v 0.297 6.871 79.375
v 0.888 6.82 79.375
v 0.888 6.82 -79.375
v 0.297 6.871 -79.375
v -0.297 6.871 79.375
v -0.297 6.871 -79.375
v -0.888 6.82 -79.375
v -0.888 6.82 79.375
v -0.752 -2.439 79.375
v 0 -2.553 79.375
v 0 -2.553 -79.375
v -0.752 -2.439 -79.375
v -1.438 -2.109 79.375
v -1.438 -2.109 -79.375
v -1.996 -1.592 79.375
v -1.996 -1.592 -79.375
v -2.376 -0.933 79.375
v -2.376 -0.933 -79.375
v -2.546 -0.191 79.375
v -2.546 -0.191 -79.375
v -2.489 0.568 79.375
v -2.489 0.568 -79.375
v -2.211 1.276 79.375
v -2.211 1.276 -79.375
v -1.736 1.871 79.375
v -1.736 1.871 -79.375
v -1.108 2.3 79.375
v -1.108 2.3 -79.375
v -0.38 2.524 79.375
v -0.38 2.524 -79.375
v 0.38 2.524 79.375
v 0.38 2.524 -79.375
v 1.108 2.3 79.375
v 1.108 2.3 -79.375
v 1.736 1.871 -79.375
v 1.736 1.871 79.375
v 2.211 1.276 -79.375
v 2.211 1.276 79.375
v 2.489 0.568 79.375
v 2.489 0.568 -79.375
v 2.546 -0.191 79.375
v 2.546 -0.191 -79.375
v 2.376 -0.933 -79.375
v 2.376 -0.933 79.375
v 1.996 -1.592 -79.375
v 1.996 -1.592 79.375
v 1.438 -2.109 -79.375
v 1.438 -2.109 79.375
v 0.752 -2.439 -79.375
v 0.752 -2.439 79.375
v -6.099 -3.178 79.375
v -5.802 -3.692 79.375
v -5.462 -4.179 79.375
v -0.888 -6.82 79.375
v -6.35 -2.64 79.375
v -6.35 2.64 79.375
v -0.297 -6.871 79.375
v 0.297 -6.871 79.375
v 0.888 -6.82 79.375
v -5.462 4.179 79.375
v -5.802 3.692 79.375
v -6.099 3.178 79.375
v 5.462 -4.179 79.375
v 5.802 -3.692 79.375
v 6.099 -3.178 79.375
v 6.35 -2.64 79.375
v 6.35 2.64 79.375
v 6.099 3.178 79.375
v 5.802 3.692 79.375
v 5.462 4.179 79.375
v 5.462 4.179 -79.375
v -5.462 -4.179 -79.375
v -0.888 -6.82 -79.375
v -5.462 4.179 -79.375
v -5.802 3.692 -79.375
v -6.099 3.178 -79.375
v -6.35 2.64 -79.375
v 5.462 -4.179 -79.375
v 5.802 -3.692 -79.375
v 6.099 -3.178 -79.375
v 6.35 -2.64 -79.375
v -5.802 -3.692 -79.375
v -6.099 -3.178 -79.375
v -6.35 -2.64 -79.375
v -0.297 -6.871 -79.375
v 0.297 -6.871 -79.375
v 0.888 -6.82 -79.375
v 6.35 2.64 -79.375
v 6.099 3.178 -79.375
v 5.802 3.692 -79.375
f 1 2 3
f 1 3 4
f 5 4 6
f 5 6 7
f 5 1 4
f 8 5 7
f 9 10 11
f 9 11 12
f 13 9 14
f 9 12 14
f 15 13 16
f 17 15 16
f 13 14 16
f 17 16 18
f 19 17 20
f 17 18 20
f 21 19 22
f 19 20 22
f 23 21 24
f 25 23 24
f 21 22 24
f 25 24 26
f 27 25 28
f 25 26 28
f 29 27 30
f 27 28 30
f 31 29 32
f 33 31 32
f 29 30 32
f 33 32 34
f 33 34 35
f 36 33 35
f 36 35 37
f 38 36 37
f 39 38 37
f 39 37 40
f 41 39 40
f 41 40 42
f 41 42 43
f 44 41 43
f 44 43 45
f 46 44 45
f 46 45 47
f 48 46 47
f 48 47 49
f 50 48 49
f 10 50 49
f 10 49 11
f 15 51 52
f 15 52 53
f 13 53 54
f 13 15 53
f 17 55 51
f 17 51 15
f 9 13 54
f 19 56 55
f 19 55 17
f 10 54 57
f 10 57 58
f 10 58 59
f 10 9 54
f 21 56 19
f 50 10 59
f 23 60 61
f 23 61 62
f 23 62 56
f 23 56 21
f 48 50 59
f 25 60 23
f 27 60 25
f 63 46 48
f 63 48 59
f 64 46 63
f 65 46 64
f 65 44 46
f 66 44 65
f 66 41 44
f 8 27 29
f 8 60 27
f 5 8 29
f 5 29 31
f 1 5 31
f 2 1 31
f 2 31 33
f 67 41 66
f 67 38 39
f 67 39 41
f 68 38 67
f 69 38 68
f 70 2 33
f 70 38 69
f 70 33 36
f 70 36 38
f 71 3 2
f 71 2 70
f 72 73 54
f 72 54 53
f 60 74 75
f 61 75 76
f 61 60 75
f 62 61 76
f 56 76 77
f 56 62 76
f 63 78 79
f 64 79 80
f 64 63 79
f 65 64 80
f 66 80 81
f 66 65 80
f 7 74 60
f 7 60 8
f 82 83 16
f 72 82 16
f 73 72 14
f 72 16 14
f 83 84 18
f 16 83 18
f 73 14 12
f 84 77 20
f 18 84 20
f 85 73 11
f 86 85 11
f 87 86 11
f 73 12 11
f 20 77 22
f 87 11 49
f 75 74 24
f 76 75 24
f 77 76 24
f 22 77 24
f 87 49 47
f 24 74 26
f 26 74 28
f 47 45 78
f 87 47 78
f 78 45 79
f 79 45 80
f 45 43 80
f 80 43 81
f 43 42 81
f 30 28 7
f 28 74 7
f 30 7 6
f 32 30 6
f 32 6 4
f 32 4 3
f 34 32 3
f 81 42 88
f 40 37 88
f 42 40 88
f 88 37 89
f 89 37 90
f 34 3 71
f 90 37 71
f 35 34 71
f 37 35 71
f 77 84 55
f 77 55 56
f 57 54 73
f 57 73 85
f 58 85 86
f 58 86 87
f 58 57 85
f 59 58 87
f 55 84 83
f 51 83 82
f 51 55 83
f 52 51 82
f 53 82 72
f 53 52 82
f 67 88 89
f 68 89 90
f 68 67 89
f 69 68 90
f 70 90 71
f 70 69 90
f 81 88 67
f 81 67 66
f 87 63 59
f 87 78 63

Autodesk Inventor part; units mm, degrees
ref_plane "YZ Plane" through (0, 0, 0) normal (1, 0, 0) x (0, 1, 0)
ref_plane "XZ Plane" through (0, 0, 0) normal (0, 1, 0) x (-1, 0, 0)
ref_plane "XY Plane" through (0, 0, 0) normal (0, 0, 1) x (1, 0, 0)
sketch "Sketch1" plane through (0, 0, 0) normal (0, 0, 1) x (1, 0, 0)
  line L0 (-6.35, -3.6662) -> (-6.35, 3.6662)
  line L1 (-6.35, 3.6662) -> (0, 7.3323)
  line L2 (0, 7.3323) -> (6.35, 3.6662)
  line L3 (6.35, 3.6662) -> (6.35, -3.6662)
  line L4 (6.35, -3.6662) -> (0, -7.3323)
  line L5 (0, -7.3323) -> (-6.35, -3.6662)
  point P0 (0, 0)
  point P1 (0, 0)
  dimension "Size" = 12.7
extrude "Extrusion1" add sketch "Sketch1" along normal mid plane 158.75
sketch "Sketch3" plane through (0, 0, 79.375) normal (0, 0, 1) x (1, 0, 0)
  line L0 (-6.35, 3.6662) -> (0, 7.3323) construction
  line L1 (0, 7.3323) -> (6.35, 3.6662) construction
  line L2 (6.35, 3.6662) -> (6.35, -3.6662) construction
  line L3 (6.35, -3.6662) -> (0, -7.3323) construction
  line L4 (0, -7.3323) -> (-6.35, -3.6662) construction
  line L5 (-6.35, -3.6662) -> (-6.35, 3.6662) construction
  point P0 (0, 0)
hole "Hole1" at (0, 0, 79.375) direction (0, 0, -1) diameter 5.1054 end through all
sketch "Sketch4" plane through (0, 0, 79.375) normal (0, 0, 1) x (1, 0, 0)
  circle A0 centre (0, 0) radius 2.5527 construction
  line L0 (-6.35, 3.6662) -> (0, 7.3323) construction
  line L1 (0, 7.3323) -> (6.35, 3.6662) construction
  line L2 (6.35, 3.6662) -> (6.35, -3.6662) construction
  line L3 (6.35, -3.6662) -> (0, -7.3323) construction
  line L4 (0, -7.3323) -> (-6.35, -3.6662) construction
  line L5 (-6.35, -3.6662) -> (-6.35, 3.6662) construction
  circle A1 centre (0, 0) radius 6.8771
  circle A2 centre (0, 0) radius 8.89
  dimension "thunder" = 13.7541
  dimension "d16" = 17.78
extrude "Extrusion3" cut sketch "Sketch4" against normal through all
equation "\"bearing\" = 25.4"
properties part number "GP5-010" material "Aluminum 6061"
